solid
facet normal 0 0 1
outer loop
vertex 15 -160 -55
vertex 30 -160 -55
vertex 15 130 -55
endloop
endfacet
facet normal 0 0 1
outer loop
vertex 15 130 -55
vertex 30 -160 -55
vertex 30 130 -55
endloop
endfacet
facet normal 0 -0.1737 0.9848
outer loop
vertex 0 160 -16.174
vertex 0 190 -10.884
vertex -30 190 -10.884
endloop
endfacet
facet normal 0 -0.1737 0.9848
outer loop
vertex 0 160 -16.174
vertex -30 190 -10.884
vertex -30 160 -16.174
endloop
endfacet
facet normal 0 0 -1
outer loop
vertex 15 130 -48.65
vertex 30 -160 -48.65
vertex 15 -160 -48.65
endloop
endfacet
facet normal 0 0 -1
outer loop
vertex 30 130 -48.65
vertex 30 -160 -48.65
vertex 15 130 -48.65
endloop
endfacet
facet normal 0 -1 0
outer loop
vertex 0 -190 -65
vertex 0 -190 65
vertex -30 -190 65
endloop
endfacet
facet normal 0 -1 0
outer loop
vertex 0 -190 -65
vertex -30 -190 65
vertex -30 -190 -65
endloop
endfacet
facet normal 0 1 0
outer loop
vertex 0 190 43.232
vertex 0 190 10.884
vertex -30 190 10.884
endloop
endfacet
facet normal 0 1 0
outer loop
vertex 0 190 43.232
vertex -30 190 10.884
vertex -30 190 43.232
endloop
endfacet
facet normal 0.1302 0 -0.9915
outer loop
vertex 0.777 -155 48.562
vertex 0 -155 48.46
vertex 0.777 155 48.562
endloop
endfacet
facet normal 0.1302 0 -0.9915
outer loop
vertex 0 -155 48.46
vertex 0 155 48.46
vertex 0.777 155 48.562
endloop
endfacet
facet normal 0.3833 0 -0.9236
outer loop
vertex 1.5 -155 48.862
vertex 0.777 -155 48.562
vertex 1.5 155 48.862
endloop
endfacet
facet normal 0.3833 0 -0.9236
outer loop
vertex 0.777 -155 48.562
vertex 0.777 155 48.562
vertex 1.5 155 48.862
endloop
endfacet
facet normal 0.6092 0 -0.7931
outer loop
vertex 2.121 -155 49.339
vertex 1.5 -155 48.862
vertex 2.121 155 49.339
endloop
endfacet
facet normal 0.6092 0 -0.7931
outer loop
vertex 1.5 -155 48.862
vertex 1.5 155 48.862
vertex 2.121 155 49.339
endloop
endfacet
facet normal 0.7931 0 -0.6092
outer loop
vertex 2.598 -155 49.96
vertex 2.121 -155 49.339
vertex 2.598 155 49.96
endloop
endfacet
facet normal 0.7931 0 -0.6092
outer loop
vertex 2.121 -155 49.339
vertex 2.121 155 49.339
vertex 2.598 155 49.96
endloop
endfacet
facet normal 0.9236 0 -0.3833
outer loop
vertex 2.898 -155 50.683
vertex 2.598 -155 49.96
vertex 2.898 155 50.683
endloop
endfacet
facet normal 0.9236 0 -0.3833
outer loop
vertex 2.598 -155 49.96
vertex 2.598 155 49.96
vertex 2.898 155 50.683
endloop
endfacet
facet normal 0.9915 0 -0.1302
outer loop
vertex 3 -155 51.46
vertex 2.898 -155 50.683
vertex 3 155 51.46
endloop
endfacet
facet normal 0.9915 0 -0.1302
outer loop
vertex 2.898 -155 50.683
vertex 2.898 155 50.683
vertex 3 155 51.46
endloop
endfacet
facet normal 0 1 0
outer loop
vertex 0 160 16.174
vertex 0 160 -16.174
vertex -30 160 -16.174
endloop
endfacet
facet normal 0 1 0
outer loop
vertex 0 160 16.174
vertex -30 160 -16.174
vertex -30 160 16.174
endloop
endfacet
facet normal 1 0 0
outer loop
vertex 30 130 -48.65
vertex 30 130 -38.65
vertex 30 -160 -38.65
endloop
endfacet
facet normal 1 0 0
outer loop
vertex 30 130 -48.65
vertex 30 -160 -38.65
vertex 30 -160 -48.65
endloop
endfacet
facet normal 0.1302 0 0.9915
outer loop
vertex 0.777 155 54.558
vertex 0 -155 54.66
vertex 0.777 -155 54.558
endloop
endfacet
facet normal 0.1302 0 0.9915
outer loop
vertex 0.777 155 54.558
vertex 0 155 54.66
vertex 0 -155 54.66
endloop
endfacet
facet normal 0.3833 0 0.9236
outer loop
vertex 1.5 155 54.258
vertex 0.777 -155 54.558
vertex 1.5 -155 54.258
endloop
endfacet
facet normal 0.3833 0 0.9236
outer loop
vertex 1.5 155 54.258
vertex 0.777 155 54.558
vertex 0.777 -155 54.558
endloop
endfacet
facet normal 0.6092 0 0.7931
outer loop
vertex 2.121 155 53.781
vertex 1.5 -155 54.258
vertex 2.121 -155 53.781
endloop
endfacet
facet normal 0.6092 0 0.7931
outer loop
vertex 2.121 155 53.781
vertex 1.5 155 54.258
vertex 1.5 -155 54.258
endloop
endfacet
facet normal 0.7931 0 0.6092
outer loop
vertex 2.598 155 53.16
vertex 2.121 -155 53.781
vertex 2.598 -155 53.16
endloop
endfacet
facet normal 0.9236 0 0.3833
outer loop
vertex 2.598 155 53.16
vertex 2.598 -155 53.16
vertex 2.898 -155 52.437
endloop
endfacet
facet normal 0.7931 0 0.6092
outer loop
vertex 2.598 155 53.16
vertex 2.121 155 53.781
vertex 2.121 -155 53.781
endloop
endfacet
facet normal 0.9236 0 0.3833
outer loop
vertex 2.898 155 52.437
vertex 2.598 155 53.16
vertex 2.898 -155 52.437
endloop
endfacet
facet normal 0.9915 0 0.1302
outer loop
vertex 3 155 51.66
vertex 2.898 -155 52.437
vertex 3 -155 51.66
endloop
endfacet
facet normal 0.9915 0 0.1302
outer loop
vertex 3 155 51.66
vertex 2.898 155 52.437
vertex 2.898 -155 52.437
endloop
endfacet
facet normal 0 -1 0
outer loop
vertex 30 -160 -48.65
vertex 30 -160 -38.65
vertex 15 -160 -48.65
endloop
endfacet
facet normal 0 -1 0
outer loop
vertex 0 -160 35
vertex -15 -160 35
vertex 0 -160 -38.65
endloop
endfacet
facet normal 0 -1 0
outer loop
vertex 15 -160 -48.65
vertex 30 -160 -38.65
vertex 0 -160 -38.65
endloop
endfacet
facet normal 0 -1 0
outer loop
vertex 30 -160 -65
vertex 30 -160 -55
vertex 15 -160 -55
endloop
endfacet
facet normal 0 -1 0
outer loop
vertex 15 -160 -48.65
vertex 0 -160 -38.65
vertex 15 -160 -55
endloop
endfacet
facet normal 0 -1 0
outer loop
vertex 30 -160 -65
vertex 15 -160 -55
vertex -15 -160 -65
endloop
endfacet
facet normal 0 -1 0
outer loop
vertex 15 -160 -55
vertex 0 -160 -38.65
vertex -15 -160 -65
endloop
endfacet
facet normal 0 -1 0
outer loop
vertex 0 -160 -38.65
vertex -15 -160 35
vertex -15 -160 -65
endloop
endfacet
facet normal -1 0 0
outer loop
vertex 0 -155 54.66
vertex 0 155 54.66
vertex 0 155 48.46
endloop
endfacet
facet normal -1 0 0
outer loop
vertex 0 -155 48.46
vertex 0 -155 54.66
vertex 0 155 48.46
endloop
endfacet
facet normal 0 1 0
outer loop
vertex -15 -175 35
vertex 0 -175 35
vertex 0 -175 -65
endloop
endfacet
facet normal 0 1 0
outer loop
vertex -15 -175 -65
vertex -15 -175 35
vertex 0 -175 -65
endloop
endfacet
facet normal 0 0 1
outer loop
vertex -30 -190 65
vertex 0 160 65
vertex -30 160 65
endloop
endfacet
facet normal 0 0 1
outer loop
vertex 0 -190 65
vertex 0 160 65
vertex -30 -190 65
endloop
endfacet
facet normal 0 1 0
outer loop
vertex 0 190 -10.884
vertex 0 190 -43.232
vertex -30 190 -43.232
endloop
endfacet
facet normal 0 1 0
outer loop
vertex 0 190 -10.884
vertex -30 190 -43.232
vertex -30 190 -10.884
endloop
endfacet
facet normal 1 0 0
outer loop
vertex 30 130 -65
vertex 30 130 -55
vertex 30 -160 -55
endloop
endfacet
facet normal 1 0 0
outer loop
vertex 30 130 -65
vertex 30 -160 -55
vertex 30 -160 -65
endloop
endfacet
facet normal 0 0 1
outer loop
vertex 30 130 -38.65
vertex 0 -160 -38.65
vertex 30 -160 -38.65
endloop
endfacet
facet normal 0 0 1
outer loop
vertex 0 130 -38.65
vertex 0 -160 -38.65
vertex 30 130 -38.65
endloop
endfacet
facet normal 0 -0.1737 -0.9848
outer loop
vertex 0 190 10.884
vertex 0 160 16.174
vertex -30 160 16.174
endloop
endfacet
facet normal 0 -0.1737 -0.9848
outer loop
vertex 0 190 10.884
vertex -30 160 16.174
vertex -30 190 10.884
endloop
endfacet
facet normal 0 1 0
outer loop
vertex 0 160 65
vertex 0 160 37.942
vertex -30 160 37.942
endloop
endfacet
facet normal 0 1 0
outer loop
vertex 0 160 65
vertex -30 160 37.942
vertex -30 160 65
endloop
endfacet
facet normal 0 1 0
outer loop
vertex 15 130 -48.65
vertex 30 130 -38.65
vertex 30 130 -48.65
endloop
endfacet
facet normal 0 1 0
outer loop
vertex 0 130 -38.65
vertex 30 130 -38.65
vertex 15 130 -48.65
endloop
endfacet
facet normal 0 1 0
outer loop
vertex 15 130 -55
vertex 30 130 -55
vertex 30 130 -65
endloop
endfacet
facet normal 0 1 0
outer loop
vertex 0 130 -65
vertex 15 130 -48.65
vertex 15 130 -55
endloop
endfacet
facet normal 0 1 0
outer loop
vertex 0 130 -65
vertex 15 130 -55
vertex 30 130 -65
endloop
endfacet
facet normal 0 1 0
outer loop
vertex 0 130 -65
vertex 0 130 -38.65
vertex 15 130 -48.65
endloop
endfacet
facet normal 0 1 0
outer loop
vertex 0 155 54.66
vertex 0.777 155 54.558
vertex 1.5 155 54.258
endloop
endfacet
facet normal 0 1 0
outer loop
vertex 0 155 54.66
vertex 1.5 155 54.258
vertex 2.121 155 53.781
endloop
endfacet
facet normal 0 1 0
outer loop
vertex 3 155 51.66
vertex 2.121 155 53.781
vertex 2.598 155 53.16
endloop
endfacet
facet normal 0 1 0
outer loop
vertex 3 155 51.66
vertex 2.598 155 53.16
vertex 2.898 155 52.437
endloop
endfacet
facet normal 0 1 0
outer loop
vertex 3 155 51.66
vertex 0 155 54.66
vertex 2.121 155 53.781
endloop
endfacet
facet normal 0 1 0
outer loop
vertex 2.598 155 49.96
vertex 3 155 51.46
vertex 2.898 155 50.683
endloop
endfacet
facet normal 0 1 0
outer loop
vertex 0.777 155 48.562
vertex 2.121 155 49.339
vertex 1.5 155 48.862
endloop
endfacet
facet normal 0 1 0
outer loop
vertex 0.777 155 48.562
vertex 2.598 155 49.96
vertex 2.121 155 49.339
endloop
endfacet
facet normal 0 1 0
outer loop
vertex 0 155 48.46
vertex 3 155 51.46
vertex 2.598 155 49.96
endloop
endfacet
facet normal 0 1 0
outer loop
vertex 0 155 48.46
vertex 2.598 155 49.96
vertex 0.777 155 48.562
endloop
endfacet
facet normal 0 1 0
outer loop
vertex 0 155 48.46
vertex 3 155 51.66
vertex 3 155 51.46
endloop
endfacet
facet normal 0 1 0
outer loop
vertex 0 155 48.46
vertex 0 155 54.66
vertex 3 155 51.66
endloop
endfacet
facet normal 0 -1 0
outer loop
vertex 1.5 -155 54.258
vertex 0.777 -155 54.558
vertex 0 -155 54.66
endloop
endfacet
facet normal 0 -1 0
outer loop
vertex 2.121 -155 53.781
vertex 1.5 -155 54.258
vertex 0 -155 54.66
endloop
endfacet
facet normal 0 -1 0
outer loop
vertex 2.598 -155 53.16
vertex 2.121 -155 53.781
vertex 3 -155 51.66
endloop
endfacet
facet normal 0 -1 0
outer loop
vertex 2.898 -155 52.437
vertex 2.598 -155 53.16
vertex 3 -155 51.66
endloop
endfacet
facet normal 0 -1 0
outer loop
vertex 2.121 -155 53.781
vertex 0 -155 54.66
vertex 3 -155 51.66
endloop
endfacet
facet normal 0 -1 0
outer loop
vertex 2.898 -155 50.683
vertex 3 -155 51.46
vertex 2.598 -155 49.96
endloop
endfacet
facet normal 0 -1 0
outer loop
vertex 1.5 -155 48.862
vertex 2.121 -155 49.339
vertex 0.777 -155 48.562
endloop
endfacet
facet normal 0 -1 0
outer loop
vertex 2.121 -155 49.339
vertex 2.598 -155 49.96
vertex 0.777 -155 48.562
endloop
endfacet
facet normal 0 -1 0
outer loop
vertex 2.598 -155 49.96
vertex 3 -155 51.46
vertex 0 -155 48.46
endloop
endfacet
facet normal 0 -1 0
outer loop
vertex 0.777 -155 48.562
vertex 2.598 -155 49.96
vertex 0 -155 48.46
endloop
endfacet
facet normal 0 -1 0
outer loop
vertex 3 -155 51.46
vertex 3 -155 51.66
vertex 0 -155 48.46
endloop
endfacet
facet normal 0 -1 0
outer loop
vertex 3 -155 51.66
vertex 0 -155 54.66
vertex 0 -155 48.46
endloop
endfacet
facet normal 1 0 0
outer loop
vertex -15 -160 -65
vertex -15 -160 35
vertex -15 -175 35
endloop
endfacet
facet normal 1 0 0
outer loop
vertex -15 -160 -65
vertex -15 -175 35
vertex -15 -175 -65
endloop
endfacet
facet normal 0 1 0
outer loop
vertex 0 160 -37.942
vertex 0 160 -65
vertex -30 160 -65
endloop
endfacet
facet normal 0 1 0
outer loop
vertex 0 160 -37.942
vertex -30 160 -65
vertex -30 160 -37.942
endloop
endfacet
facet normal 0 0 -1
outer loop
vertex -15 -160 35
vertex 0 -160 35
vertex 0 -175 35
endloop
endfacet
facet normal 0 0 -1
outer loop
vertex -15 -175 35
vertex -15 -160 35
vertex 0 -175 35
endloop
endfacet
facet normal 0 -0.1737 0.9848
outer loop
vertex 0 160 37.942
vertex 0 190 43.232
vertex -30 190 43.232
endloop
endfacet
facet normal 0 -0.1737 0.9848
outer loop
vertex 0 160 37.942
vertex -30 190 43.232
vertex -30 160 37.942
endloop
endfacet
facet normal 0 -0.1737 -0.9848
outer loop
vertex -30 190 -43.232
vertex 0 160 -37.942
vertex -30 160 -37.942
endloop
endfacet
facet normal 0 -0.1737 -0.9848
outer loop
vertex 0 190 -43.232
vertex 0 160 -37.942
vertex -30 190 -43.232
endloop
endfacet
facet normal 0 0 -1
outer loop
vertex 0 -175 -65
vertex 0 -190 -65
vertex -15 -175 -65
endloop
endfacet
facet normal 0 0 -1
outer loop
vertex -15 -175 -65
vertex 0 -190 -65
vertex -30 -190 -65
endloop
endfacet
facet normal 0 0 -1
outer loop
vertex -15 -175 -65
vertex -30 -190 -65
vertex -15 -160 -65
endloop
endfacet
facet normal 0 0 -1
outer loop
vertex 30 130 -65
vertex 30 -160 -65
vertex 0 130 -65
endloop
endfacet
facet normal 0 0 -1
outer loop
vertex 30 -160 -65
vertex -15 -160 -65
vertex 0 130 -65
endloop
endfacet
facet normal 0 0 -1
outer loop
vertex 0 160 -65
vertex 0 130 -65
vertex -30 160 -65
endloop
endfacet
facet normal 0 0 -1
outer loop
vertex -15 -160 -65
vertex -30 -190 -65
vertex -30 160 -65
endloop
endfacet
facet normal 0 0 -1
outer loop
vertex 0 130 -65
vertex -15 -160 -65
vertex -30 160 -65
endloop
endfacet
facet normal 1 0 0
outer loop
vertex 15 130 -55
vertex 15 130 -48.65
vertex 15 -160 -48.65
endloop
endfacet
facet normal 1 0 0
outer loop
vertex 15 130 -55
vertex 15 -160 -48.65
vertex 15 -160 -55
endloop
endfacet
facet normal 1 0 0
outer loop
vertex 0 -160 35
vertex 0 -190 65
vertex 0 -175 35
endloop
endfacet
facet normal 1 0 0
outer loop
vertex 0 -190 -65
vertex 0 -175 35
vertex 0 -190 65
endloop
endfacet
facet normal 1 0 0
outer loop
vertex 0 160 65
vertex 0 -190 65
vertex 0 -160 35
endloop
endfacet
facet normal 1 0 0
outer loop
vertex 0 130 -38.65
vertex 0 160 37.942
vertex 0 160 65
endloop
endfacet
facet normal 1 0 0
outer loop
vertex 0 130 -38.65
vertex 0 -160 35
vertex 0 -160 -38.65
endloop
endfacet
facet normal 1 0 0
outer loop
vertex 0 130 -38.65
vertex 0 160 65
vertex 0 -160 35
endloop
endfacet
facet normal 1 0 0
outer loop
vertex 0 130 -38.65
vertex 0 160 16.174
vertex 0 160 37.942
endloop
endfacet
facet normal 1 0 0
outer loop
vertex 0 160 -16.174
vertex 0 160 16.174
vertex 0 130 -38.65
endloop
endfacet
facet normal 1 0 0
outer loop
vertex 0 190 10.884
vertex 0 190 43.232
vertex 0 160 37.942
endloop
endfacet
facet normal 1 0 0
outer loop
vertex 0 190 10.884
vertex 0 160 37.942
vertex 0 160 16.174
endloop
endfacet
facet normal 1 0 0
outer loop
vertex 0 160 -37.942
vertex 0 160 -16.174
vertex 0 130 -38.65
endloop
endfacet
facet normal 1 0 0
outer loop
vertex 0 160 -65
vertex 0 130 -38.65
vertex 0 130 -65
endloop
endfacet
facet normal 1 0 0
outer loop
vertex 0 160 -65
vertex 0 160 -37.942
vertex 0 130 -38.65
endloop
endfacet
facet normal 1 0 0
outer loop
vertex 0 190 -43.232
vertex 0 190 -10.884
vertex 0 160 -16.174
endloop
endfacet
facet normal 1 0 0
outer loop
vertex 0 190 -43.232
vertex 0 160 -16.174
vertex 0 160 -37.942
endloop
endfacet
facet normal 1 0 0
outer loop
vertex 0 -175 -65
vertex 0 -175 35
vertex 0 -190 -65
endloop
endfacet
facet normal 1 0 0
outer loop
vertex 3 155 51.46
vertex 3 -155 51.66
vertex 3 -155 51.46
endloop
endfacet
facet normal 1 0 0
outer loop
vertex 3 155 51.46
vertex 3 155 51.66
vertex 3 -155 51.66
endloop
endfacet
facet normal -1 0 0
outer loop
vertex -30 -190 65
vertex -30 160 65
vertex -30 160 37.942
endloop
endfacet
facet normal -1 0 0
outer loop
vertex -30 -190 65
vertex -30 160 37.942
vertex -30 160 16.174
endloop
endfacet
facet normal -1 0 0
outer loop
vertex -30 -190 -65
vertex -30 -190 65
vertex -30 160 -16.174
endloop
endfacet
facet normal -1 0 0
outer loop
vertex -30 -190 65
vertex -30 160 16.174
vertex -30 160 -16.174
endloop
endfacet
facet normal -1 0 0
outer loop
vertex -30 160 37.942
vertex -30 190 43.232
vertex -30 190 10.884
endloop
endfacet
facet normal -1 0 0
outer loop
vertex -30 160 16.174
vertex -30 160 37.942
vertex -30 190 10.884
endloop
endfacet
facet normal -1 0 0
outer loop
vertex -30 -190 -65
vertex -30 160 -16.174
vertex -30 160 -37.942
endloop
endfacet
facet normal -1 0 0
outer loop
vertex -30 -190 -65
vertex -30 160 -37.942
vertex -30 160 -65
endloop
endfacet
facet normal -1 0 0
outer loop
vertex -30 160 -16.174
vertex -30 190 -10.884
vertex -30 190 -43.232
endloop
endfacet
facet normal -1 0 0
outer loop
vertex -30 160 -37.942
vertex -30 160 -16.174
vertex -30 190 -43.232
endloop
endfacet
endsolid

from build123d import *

# Parameters (mm, degrees)
BOSS_EXTRUDE2_DEPTH = 30
SKETCH1_3_W         = 6.2
SKETCH1_3_H         = 310
BOSS_EXTRUDE3_DEPTH = 3
FILLET2_R           = 3
CUT_EXTRUDE1_DEPTH  = 15
SKETCH1_7_W         = 26.35
SKETCH1_7_H         = 290
BOSS_EXTRUDE6_DEPTH = 30
SKETCH4_W           = 6.35
SKETCH4_H           = 290
CUT_EXTRUDE4_DEPTH  = 15


with BuildPart() as part:
    # Sketch1 → Boss-Extrude2 (new body)
    with BuildSketch(Plane(origin=(0, 0, 0), x_dir=(0, 0, -1), z_dir=(1, 0, 0))):
        Polygon((-37.942, 160), (-65, 160), (-65, -190), (65, -190), (65, 160), (37.942, 160), (43.232, 190), (10.884, 190), (16.174, 160), (-16.174, 160), (-10.884, 190), (-43.232, 190), align=None)
    extrude(amount=-BOSS_EXTRUDE2_DEPTH)

    # Sketch1<5> → Cut-Extrude1 (cut)
    with BuildSketch(Plane(origin=(0, 0, 0), x_dir=(0, 0, -1), z_dir=(1, 0, 0))):
        Polygon((38.65, -160), (-35, -160), (-35, -175), (65, -175), (65, -160), align=None)
    extrude(amount=-CUT_EXTRUDE1_DEPTH, mode=Mode.SUBTRACT)

    # Sketch1<7> → Boss-Extrude6 (add)
    with BuildSketch(Plane(origin=(0, 0, 0), x_dir=(0, 0, -1), z_dir=(1, 0, 0))):
        with Locations((51.825, -15)):
            Rectangle(SKETCH1_7_W, SKETCH1_7_H)
    extrude(amount=BOSS_EXTRUDE6_DEPTH)

    # Sketch4 → Cut-Extrude4 (cut)
    with BuildSketch(Plane(origin=(30, 0, 0), x_dir=(0, 0, -1), z_dir=(1, 0, 0))):
        with Locations((51.825, -15)):
            Rectangle(SKETCH4_W, SKETCH4_H)
    extrude(amount=-CUT_EXTRUDE4_DEPTH, mode=Mode.SUBTRACT)


with BuildPart() as body_2:
    # Sketch1<3> → Boss-Extrude3 (new body)
    with BuildSketch(Plane(origin=(0, 0, 0), x_dir=(0, 0, -1), z_dir=(1, 0, 0))):
        with Locations((-51.56, 0)):
            Rectangle(SKETCH1_3_W, SKETCH1_3_H)
    extrude(amount=BOSS_EXTRUDE3_DEPTH)

    # Fillet2
    fillet2_edges = [body_2.edges().sort_by_distance(p)[0] for p in [
        (3, 0, 48.46),
        (3, 0, 54.66),
    ]]
    fillet(fillet2_edges, radius=FILLET2_R - 0.0001)  # a hair under: the kernel refuses the full size


solid = Compound([part.part, body_2.part])
